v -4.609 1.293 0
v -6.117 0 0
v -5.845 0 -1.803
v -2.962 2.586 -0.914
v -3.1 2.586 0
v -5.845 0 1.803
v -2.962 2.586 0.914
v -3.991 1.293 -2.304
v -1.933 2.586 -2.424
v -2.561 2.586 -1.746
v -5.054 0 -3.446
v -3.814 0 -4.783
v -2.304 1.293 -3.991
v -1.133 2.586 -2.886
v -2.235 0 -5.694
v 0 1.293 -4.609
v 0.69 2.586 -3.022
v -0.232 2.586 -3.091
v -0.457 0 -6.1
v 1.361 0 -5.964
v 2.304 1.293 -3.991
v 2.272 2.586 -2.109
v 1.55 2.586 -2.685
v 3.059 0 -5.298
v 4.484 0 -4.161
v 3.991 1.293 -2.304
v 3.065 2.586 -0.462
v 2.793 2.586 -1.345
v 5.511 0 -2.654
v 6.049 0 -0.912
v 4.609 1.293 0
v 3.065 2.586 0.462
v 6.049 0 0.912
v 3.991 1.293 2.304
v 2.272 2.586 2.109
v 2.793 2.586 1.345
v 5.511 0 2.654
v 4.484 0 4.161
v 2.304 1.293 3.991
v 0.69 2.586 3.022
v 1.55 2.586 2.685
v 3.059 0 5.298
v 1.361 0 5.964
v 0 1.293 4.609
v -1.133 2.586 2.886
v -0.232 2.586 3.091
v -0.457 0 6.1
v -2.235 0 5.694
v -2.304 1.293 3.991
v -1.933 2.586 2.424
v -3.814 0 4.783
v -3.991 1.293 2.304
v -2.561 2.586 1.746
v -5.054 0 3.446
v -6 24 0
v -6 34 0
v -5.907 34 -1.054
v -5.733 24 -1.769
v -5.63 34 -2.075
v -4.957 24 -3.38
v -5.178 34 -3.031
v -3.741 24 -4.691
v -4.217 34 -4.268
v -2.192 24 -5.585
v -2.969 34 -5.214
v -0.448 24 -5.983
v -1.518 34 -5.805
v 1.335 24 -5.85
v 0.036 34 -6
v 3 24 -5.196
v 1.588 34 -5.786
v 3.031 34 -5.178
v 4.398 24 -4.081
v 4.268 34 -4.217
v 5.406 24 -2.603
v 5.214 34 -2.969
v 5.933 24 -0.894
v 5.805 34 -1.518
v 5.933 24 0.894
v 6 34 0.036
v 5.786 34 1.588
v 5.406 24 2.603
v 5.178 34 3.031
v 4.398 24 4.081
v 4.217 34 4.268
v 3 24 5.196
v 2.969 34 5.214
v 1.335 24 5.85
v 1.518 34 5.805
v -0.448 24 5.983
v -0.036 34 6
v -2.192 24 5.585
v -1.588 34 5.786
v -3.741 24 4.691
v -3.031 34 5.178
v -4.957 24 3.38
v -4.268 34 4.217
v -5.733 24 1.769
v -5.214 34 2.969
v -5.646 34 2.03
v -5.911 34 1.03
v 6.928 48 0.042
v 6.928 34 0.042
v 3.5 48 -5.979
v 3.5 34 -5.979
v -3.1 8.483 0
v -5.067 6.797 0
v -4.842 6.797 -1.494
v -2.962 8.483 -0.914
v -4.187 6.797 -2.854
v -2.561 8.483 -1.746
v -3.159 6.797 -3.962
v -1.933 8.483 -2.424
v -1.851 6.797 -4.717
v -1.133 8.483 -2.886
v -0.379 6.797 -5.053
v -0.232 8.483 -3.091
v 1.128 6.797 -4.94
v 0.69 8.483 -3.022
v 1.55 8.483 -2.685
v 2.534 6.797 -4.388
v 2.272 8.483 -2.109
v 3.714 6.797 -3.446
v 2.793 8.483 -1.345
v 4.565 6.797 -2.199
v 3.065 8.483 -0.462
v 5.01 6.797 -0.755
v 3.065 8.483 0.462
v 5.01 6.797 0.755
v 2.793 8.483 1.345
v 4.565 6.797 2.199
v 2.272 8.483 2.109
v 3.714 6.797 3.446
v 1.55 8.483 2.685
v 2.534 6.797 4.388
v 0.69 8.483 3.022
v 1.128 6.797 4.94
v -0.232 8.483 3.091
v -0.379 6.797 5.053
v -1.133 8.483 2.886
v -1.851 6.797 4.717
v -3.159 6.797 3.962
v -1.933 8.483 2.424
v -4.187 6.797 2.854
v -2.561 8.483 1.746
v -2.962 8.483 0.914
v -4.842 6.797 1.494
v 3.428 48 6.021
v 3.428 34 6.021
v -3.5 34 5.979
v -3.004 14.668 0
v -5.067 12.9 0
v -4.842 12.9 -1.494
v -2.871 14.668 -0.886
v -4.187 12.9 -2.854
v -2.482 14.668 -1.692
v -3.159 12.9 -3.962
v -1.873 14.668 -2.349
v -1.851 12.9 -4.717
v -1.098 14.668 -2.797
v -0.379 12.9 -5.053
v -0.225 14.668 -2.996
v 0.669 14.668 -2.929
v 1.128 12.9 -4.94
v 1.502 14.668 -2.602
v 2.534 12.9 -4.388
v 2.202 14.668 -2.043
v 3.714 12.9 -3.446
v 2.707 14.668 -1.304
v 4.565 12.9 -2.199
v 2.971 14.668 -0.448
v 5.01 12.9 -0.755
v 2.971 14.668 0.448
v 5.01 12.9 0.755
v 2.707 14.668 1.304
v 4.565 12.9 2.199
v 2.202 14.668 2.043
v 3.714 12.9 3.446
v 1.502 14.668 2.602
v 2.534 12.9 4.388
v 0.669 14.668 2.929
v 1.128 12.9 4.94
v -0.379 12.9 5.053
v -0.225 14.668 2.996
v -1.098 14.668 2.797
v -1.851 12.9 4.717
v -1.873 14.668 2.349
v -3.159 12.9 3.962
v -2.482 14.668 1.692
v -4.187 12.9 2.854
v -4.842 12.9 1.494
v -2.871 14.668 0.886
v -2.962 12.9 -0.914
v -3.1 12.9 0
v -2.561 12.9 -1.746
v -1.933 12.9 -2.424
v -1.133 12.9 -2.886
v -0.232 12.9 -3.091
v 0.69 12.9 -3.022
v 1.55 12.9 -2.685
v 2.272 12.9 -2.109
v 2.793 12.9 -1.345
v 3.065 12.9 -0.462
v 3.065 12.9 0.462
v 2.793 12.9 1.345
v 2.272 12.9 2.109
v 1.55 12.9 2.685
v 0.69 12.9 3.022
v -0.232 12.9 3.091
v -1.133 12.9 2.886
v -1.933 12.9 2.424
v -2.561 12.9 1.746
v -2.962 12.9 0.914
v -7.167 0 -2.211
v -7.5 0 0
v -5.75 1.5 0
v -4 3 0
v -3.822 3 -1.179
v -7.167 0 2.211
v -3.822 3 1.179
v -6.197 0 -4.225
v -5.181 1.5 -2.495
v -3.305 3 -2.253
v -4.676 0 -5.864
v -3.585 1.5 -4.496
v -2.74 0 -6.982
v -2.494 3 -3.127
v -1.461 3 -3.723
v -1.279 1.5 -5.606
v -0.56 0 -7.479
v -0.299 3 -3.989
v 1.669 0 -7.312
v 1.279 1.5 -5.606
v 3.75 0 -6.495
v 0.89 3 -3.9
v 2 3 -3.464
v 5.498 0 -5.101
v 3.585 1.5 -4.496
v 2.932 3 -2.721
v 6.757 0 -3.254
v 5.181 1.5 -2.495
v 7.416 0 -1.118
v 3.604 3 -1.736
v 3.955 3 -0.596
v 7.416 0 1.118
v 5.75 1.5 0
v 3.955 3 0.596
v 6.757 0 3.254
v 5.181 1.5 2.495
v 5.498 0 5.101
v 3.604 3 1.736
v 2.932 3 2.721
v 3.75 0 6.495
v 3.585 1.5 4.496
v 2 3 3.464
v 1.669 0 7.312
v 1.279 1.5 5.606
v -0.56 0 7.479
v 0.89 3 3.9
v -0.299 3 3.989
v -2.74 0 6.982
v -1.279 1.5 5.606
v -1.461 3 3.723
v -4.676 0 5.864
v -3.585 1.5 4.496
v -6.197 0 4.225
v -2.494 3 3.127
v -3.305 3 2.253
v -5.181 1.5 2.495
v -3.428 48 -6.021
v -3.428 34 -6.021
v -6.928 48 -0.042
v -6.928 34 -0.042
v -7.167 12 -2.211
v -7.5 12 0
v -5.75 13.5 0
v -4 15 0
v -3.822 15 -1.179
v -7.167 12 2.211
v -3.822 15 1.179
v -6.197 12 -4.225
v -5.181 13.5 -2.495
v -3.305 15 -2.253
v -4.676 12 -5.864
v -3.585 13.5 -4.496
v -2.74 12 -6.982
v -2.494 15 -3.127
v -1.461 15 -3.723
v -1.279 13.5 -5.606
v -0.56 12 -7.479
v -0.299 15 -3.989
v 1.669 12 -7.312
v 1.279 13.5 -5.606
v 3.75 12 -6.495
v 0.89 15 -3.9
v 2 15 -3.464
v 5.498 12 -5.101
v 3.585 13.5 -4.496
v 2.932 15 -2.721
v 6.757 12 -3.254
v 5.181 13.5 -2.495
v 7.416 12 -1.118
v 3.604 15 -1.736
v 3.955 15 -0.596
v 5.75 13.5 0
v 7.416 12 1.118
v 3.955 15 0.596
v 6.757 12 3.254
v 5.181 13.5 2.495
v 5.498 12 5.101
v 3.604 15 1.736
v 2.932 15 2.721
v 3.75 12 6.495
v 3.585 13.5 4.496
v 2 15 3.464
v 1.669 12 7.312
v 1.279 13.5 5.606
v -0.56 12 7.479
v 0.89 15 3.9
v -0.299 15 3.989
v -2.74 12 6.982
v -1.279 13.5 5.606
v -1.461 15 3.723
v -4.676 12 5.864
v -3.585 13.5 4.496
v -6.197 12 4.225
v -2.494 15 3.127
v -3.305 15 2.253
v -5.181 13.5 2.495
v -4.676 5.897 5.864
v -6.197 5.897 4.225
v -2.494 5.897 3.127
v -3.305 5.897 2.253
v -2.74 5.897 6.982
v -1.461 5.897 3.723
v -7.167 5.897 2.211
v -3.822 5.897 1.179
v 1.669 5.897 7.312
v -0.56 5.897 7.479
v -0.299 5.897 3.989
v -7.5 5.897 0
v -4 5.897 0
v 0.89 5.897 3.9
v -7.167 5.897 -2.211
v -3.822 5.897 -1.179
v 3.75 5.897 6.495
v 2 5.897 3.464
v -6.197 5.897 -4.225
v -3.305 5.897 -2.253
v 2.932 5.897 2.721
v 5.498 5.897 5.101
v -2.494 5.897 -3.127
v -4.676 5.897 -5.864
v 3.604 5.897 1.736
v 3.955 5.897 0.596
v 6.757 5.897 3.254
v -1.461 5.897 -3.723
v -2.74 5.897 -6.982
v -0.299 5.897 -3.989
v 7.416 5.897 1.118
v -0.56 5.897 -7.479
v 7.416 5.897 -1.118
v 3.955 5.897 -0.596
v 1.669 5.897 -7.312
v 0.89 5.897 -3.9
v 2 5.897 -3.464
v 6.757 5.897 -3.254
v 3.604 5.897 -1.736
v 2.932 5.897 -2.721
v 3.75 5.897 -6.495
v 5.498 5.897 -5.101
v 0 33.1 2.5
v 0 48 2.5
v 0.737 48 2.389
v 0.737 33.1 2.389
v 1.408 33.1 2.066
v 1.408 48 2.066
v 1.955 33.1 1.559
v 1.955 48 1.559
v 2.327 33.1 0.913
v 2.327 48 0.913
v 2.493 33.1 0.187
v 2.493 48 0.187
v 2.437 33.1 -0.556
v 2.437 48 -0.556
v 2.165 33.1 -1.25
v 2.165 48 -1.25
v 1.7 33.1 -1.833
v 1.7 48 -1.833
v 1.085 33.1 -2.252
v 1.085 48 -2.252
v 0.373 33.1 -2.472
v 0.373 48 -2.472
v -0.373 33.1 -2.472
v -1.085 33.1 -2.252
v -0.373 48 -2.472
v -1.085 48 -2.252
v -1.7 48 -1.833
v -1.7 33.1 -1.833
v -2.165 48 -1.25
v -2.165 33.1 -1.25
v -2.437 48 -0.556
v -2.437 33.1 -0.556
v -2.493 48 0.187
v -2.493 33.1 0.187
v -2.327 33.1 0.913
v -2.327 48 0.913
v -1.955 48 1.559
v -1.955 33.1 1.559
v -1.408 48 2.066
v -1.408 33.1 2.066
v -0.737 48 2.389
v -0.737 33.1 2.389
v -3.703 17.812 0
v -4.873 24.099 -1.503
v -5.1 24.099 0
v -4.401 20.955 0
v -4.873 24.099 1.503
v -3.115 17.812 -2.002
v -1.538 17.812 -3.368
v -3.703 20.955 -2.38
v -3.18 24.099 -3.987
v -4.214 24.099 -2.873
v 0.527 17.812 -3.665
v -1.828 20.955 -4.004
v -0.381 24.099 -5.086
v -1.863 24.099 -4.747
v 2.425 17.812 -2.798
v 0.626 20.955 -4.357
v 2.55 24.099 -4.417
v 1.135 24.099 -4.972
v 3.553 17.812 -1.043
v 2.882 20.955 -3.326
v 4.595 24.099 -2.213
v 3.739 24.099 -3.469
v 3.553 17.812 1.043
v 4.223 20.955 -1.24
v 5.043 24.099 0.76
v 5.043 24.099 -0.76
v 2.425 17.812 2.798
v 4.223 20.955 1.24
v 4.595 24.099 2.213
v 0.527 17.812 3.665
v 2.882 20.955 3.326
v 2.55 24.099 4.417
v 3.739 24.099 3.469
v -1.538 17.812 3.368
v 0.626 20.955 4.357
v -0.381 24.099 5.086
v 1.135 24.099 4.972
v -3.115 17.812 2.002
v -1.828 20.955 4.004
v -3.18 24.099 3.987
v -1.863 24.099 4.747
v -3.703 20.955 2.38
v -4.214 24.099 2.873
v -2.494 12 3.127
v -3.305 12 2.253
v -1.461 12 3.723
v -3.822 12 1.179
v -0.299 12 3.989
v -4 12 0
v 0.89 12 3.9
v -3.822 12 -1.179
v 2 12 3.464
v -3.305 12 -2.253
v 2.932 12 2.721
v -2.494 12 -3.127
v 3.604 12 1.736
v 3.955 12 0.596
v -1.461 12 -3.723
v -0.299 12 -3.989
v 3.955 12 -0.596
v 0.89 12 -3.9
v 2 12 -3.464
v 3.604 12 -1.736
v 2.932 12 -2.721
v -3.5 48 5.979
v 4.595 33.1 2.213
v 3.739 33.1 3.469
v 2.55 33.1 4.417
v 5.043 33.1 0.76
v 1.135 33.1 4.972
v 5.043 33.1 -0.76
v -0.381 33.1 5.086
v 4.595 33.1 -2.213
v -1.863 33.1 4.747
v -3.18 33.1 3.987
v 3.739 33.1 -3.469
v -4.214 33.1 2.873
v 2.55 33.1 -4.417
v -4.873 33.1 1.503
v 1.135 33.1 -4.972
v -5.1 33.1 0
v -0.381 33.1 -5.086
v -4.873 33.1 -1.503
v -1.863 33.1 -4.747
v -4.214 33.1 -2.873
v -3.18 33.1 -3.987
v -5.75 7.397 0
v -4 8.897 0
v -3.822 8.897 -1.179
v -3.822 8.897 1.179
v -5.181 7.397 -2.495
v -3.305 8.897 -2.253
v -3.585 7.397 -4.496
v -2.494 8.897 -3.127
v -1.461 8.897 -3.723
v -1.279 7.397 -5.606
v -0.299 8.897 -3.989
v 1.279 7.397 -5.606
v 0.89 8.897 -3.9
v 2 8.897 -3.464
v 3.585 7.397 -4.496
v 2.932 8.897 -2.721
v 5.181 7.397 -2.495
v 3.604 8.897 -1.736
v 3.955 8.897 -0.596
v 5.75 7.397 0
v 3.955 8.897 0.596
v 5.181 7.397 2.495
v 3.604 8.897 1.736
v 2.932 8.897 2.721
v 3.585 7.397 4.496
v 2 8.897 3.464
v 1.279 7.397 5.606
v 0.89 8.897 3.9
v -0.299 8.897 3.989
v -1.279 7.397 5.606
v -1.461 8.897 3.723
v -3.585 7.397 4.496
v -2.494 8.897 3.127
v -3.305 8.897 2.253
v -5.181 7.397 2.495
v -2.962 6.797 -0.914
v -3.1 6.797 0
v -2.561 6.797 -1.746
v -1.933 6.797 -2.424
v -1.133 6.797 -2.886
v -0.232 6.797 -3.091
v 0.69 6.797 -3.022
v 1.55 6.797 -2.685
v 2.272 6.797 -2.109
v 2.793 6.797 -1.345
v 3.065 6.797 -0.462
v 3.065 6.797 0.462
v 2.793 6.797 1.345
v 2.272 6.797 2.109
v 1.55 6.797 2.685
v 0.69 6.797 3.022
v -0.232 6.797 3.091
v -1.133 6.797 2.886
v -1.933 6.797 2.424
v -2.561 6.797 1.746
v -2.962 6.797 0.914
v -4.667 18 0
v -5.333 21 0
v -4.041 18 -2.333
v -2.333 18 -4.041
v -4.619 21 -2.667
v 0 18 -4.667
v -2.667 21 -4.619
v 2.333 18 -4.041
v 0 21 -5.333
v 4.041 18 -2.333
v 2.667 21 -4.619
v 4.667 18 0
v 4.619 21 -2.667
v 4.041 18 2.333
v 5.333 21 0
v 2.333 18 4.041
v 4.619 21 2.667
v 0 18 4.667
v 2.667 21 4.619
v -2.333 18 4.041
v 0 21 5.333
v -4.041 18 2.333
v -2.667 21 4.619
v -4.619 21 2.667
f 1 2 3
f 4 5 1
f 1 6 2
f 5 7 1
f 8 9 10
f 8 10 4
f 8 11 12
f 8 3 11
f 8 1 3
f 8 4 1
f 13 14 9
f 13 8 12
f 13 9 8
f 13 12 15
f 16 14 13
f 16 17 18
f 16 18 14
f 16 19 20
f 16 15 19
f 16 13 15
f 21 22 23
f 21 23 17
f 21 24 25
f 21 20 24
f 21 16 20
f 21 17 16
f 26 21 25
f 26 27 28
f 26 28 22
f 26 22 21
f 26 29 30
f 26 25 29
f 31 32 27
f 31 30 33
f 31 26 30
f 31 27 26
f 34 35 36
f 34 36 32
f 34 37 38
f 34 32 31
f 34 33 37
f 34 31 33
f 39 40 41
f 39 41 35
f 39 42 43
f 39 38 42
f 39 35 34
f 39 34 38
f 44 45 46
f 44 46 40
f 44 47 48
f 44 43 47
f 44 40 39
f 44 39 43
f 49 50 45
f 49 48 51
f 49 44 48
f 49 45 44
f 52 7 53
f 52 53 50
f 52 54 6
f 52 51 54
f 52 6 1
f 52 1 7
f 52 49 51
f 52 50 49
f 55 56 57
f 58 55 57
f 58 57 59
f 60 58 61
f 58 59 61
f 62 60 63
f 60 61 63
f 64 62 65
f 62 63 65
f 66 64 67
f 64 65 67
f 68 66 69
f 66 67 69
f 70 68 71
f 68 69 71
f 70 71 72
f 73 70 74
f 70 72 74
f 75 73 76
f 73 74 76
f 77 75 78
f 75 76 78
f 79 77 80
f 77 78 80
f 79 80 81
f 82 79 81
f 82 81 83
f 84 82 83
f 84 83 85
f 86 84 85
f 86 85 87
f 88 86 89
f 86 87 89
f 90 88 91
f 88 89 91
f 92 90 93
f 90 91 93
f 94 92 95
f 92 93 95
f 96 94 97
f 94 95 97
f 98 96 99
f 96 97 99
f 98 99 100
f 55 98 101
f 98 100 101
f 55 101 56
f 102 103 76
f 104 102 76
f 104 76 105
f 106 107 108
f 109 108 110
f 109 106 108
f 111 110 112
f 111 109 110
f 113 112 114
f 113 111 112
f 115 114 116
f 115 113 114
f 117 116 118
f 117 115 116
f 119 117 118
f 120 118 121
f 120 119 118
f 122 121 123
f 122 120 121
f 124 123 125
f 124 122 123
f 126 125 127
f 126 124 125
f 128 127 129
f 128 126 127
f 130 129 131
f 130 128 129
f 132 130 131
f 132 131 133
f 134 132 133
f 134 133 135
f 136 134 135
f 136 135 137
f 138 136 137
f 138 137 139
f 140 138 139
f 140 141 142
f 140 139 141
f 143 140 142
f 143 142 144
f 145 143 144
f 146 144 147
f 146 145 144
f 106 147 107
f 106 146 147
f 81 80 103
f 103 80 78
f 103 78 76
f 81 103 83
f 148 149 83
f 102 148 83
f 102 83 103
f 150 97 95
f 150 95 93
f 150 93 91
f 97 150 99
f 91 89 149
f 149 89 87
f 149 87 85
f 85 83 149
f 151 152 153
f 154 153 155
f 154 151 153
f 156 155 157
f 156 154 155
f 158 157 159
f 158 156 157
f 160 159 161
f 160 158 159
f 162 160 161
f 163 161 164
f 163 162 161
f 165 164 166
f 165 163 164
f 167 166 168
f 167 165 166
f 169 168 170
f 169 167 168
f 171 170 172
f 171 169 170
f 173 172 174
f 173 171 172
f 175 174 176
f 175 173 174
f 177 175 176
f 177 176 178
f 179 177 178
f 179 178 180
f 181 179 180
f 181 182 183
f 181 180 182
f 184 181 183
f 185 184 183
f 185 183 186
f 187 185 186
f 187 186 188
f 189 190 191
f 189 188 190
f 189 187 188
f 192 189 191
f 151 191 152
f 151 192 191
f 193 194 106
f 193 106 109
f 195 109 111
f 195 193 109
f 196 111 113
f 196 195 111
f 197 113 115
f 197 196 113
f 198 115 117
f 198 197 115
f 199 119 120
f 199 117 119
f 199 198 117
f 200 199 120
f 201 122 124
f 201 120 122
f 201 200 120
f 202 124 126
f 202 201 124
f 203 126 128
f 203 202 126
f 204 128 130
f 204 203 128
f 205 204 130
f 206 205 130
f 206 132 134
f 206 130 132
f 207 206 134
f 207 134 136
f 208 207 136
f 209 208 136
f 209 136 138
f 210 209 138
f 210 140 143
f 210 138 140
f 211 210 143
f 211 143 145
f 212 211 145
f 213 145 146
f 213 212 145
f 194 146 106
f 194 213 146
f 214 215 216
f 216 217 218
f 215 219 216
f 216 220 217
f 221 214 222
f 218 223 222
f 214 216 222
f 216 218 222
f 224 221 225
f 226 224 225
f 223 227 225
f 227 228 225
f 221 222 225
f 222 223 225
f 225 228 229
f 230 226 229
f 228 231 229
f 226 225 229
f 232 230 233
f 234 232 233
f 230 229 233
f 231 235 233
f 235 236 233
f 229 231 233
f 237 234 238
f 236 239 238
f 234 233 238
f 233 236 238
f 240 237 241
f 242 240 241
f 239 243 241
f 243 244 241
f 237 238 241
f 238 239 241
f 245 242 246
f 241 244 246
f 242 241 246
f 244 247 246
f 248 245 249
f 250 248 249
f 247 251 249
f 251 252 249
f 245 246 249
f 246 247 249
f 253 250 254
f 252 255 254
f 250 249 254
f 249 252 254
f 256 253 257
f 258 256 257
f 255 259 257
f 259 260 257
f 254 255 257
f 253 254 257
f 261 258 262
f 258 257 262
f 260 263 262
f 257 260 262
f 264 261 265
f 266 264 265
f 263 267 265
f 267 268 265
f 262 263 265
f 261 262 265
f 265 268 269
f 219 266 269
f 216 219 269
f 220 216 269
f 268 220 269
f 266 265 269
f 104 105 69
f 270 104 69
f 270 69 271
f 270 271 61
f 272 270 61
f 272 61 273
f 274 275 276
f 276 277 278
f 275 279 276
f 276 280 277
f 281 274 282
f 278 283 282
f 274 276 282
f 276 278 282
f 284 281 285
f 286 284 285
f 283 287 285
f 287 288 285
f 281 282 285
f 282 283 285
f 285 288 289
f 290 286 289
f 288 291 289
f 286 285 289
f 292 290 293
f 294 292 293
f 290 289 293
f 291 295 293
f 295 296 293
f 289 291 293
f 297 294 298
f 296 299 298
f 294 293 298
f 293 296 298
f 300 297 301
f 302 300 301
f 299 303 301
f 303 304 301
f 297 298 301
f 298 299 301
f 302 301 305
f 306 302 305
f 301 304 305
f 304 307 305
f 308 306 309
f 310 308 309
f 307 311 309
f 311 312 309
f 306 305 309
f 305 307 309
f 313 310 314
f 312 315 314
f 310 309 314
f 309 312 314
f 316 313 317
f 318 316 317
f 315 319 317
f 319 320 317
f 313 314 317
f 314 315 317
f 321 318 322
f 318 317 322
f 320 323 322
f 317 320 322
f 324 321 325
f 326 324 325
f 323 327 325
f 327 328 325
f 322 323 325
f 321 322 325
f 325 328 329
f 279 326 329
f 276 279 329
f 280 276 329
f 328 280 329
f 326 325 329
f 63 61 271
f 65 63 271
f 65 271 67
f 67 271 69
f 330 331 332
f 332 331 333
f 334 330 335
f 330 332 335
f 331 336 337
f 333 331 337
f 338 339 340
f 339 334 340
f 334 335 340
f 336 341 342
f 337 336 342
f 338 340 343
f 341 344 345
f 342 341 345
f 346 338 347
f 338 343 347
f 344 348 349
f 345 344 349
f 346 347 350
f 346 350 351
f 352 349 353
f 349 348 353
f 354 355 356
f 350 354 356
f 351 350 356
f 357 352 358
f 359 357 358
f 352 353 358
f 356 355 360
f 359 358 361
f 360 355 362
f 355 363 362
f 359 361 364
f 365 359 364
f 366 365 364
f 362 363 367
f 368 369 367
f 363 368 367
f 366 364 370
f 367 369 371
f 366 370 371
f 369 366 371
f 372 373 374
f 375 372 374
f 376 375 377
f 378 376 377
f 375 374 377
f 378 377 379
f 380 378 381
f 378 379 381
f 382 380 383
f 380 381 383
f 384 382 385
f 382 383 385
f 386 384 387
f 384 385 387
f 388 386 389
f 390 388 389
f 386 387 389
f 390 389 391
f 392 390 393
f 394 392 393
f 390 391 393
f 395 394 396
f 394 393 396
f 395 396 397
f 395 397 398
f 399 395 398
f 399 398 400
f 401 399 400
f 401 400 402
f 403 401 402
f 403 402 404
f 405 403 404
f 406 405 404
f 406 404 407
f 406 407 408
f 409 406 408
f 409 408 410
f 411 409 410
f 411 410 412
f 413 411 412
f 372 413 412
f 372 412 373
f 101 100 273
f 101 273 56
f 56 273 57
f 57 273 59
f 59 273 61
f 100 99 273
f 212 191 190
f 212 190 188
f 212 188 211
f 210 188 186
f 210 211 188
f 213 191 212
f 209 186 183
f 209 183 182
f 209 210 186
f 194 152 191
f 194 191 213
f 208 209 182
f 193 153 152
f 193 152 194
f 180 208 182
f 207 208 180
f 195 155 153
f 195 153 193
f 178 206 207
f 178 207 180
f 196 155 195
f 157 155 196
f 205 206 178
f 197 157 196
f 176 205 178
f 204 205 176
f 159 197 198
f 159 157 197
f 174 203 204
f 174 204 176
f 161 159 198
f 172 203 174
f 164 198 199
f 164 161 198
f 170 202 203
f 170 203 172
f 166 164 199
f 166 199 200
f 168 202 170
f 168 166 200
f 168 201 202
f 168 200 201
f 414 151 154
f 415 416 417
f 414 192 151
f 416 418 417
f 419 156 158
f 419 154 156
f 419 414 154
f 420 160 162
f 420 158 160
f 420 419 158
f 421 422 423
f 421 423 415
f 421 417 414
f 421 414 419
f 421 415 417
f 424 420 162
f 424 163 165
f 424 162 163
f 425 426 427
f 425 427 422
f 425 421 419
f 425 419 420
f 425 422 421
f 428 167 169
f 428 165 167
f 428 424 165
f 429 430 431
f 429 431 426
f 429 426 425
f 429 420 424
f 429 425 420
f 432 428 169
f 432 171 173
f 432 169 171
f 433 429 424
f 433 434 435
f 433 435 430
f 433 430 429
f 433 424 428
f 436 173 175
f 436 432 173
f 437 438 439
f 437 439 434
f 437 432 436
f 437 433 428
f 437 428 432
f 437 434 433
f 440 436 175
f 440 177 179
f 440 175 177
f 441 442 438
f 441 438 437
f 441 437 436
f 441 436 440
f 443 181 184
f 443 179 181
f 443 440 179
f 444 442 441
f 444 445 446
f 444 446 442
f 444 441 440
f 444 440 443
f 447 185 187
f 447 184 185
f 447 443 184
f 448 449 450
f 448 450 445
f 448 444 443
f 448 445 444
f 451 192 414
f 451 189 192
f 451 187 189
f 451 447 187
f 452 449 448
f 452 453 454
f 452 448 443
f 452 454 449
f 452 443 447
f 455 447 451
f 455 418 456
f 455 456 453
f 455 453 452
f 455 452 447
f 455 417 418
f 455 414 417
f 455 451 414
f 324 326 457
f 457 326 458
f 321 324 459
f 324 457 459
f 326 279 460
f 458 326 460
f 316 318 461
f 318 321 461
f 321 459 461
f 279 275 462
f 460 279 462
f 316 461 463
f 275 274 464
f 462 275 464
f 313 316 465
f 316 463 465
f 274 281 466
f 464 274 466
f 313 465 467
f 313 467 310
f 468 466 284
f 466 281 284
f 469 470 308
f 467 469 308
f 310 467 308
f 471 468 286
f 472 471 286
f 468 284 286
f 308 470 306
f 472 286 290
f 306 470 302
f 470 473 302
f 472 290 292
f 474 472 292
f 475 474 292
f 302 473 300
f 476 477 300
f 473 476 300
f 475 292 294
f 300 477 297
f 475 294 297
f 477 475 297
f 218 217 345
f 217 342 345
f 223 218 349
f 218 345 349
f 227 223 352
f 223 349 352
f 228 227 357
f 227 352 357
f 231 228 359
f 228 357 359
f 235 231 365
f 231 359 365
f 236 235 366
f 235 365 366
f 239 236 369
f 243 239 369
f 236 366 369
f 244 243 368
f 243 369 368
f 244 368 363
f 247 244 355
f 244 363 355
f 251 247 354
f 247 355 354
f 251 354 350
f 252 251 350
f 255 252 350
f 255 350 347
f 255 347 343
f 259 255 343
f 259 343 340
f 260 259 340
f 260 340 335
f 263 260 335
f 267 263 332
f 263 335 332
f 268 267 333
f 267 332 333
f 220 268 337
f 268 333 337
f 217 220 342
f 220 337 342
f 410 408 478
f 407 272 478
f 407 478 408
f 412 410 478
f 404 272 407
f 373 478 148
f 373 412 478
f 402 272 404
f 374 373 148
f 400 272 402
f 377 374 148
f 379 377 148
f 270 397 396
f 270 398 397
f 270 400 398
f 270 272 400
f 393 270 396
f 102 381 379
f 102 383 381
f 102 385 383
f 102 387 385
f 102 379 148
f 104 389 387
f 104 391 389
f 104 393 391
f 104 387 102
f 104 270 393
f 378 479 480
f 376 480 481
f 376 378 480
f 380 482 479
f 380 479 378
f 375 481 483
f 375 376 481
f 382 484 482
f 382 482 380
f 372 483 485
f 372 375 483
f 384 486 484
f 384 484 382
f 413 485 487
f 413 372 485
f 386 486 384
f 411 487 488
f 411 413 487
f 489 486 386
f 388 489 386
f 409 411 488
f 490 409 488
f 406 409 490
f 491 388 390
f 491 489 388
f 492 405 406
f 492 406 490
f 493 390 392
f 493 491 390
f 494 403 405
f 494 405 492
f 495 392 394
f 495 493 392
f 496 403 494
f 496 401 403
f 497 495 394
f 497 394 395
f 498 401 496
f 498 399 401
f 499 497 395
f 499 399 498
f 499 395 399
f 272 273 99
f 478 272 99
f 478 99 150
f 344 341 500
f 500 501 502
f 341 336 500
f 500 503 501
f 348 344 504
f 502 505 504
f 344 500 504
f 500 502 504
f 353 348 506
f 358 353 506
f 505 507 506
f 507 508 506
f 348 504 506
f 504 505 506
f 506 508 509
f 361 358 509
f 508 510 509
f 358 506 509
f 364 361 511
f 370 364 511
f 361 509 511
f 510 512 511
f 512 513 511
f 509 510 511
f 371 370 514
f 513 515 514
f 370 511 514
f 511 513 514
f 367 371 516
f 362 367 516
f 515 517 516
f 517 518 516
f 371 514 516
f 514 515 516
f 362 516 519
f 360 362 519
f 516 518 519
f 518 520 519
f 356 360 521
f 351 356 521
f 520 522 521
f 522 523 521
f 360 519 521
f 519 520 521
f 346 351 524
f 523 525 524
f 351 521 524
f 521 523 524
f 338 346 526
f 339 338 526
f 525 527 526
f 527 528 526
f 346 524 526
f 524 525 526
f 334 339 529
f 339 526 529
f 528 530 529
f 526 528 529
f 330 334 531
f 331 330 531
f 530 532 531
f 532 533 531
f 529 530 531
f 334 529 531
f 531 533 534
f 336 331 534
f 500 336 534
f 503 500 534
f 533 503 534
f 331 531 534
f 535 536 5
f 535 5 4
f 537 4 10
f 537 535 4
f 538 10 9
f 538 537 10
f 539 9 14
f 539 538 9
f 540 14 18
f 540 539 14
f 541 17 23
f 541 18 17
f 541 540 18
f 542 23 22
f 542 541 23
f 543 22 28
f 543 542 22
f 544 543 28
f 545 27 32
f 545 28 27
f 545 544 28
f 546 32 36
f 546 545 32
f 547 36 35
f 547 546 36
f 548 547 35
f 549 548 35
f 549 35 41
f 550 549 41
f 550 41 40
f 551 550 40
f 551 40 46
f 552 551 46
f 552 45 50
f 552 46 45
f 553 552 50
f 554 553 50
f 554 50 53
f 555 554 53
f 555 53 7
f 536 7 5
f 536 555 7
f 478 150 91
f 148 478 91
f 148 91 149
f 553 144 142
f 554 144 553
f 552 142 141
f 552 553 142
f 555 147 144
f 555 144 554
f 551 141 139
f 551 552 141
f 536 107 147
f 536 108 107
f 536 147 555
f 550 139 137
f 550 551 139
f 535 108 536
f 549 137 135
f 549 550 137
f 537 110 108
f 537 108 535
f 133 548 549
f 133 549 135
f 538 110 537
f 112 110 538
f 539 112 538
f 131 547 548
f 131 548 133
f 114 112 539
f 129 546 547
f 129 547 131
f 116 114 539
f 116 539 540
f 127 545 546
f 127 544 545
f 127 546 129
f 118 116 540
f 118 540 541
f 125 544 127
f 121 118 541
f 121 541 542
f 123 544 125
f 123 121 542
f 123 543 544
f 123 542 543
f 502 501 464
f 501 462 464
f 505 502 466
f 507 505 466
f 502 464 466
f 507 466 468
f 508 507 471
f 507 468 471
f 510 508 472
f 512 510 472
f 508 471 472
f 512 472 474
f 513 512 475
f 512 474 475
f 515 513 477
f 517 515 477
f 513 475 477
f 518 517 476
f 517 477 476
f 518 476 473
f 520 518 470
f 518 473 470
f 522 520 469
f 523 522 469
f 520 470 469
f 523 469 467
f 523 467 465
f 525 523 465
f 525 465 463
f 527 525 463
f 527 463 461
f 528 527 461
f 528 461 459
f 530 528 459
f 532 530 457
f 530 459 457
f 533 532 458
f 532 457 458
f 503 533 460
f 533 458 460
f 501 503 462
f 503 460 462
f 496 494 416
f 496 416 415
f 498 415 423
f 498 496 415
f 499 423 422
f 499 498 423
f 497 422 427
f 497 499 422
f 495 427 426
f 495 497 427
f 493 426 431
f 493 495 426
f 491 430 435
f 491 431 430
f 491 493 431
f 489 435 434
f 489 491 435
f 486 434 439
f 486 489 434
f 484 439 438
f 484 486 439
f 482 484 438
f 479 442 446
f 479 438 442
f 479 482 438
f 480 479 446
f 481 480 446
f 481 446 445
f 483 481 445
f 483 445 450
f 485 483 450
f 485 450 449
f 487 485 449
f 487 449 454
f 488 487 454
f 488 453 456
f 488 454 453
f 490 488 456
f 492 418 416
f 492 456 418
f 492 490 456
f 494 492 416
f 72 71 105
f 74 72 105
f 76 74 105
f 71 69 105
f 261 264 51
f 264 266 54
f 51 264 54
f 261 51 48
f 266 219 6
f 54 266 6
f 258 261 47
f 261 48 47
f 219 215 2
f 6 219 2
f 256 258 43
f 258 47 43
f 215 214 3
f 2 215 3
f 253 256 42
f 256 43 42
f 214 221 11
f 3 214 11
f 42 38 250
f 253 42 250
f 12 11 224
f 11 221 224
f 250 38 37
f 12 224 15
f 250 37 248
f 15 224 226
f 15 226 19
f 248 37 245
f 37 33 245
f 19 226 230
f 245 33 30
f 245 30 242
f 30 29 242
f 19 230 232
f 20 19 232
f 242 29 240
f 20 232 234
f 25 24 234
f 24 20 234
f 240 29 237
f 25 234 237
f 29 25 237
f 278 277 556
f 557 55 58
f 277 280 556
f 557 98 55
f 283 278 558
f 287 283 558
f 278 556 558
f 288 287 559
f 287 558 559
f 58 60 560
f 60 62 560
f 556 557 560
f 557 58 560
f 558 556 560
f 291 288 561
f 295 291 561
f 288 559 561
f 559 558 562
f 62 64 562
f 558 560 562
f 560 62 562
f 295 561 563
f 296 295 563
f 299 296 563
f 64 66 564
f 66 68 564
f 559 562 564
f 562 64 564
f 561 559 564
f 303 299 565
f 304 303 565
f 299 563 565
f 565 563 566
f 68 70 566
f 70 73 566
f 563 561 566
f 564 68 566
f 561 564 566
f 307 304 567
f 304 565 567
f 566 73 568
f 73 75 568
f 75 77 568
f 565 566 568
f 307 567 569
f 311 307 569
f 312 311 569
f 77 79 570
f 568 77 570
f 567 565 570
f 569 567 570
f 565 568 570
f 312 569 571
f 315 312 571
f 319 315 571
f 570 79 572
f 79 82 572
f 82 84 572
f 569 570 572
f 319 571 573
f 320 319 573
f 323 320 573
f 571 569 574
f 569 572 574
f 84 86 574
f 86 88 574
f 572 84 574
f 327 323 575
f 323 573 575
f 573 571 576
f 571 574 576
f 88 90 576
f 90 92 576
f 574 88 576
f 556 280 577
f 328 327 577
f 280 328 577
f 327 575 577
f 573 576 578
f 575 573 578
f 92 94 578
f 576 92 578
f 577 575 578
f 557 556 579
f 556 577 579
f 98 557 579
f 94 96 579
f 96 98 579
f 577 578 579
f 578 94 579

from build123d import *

# Parameters (mm, degrees)
COQUE_T       = -0.9
BOSSAGE_DEPTH = 14
ESQUISSE3_R   = 2.5
ENLEV_DEPTH   = 50.157908825


with BuildPart() as part:
    # esquisse → revolution (revolve)
    with BuildSketch(Plane.XY, mode=Mode.PRIVATE) as revolution_sk:
        Polygon((0, 0), (7.5, 0), (4, 3), (4, 5.897032863), (7.5, 5.897032863), (4, 8.897032863), (4, 12), (7.5, 12), (4, 15), (6, 24), (6, 34), (0, 34), align=None)
    revolve(revolution_sk.sketch.rotate(Axis((0, 34, 0), (0, -1, 0)), 180), axis=Axis((0, 34, 0), (0, -1, 0)))

    # coque
    coque_openings = [part.faces().sort_by_distance(p)[0] for p in [
        (0, 0, 0),
    ]]
    offset(amount=COQUE_T, openings=coque_openings, kind=Kind.INTERSECTION)

    # Esboço2 → bossage (add)
    with BuildSketch(Plane(origin=(0, 34, 0), x_dir=(1, 0, 0), z_dir=(0, 1, 0))):
        Polygon((3.499984176, 5.979139634), (-3.428094728, 6.020645027), (-6.928078904, 0.041505392), (-3.499984176, -5.979139634), (3.428094728, -6.020645027), (6.928078904, -0.041505392), align=None)
    extrude(amount=BOSSAGE_DEPTH)

    # esquisse3 → enlev (cut, through all)
    with BuildSketch(Plane(origin=(0, 48, 0), x_dir=(1, 0, 0), z_dir=(0, 1, 0))):
        with Locations(Location((0, 0, 0), (0, 0, 270))):
            Circle(ESQUISSE3_R)
    extrude(amount=-ENLEV_DEPTH, mode=Mode.SUBTRACT)


solid = part.part
